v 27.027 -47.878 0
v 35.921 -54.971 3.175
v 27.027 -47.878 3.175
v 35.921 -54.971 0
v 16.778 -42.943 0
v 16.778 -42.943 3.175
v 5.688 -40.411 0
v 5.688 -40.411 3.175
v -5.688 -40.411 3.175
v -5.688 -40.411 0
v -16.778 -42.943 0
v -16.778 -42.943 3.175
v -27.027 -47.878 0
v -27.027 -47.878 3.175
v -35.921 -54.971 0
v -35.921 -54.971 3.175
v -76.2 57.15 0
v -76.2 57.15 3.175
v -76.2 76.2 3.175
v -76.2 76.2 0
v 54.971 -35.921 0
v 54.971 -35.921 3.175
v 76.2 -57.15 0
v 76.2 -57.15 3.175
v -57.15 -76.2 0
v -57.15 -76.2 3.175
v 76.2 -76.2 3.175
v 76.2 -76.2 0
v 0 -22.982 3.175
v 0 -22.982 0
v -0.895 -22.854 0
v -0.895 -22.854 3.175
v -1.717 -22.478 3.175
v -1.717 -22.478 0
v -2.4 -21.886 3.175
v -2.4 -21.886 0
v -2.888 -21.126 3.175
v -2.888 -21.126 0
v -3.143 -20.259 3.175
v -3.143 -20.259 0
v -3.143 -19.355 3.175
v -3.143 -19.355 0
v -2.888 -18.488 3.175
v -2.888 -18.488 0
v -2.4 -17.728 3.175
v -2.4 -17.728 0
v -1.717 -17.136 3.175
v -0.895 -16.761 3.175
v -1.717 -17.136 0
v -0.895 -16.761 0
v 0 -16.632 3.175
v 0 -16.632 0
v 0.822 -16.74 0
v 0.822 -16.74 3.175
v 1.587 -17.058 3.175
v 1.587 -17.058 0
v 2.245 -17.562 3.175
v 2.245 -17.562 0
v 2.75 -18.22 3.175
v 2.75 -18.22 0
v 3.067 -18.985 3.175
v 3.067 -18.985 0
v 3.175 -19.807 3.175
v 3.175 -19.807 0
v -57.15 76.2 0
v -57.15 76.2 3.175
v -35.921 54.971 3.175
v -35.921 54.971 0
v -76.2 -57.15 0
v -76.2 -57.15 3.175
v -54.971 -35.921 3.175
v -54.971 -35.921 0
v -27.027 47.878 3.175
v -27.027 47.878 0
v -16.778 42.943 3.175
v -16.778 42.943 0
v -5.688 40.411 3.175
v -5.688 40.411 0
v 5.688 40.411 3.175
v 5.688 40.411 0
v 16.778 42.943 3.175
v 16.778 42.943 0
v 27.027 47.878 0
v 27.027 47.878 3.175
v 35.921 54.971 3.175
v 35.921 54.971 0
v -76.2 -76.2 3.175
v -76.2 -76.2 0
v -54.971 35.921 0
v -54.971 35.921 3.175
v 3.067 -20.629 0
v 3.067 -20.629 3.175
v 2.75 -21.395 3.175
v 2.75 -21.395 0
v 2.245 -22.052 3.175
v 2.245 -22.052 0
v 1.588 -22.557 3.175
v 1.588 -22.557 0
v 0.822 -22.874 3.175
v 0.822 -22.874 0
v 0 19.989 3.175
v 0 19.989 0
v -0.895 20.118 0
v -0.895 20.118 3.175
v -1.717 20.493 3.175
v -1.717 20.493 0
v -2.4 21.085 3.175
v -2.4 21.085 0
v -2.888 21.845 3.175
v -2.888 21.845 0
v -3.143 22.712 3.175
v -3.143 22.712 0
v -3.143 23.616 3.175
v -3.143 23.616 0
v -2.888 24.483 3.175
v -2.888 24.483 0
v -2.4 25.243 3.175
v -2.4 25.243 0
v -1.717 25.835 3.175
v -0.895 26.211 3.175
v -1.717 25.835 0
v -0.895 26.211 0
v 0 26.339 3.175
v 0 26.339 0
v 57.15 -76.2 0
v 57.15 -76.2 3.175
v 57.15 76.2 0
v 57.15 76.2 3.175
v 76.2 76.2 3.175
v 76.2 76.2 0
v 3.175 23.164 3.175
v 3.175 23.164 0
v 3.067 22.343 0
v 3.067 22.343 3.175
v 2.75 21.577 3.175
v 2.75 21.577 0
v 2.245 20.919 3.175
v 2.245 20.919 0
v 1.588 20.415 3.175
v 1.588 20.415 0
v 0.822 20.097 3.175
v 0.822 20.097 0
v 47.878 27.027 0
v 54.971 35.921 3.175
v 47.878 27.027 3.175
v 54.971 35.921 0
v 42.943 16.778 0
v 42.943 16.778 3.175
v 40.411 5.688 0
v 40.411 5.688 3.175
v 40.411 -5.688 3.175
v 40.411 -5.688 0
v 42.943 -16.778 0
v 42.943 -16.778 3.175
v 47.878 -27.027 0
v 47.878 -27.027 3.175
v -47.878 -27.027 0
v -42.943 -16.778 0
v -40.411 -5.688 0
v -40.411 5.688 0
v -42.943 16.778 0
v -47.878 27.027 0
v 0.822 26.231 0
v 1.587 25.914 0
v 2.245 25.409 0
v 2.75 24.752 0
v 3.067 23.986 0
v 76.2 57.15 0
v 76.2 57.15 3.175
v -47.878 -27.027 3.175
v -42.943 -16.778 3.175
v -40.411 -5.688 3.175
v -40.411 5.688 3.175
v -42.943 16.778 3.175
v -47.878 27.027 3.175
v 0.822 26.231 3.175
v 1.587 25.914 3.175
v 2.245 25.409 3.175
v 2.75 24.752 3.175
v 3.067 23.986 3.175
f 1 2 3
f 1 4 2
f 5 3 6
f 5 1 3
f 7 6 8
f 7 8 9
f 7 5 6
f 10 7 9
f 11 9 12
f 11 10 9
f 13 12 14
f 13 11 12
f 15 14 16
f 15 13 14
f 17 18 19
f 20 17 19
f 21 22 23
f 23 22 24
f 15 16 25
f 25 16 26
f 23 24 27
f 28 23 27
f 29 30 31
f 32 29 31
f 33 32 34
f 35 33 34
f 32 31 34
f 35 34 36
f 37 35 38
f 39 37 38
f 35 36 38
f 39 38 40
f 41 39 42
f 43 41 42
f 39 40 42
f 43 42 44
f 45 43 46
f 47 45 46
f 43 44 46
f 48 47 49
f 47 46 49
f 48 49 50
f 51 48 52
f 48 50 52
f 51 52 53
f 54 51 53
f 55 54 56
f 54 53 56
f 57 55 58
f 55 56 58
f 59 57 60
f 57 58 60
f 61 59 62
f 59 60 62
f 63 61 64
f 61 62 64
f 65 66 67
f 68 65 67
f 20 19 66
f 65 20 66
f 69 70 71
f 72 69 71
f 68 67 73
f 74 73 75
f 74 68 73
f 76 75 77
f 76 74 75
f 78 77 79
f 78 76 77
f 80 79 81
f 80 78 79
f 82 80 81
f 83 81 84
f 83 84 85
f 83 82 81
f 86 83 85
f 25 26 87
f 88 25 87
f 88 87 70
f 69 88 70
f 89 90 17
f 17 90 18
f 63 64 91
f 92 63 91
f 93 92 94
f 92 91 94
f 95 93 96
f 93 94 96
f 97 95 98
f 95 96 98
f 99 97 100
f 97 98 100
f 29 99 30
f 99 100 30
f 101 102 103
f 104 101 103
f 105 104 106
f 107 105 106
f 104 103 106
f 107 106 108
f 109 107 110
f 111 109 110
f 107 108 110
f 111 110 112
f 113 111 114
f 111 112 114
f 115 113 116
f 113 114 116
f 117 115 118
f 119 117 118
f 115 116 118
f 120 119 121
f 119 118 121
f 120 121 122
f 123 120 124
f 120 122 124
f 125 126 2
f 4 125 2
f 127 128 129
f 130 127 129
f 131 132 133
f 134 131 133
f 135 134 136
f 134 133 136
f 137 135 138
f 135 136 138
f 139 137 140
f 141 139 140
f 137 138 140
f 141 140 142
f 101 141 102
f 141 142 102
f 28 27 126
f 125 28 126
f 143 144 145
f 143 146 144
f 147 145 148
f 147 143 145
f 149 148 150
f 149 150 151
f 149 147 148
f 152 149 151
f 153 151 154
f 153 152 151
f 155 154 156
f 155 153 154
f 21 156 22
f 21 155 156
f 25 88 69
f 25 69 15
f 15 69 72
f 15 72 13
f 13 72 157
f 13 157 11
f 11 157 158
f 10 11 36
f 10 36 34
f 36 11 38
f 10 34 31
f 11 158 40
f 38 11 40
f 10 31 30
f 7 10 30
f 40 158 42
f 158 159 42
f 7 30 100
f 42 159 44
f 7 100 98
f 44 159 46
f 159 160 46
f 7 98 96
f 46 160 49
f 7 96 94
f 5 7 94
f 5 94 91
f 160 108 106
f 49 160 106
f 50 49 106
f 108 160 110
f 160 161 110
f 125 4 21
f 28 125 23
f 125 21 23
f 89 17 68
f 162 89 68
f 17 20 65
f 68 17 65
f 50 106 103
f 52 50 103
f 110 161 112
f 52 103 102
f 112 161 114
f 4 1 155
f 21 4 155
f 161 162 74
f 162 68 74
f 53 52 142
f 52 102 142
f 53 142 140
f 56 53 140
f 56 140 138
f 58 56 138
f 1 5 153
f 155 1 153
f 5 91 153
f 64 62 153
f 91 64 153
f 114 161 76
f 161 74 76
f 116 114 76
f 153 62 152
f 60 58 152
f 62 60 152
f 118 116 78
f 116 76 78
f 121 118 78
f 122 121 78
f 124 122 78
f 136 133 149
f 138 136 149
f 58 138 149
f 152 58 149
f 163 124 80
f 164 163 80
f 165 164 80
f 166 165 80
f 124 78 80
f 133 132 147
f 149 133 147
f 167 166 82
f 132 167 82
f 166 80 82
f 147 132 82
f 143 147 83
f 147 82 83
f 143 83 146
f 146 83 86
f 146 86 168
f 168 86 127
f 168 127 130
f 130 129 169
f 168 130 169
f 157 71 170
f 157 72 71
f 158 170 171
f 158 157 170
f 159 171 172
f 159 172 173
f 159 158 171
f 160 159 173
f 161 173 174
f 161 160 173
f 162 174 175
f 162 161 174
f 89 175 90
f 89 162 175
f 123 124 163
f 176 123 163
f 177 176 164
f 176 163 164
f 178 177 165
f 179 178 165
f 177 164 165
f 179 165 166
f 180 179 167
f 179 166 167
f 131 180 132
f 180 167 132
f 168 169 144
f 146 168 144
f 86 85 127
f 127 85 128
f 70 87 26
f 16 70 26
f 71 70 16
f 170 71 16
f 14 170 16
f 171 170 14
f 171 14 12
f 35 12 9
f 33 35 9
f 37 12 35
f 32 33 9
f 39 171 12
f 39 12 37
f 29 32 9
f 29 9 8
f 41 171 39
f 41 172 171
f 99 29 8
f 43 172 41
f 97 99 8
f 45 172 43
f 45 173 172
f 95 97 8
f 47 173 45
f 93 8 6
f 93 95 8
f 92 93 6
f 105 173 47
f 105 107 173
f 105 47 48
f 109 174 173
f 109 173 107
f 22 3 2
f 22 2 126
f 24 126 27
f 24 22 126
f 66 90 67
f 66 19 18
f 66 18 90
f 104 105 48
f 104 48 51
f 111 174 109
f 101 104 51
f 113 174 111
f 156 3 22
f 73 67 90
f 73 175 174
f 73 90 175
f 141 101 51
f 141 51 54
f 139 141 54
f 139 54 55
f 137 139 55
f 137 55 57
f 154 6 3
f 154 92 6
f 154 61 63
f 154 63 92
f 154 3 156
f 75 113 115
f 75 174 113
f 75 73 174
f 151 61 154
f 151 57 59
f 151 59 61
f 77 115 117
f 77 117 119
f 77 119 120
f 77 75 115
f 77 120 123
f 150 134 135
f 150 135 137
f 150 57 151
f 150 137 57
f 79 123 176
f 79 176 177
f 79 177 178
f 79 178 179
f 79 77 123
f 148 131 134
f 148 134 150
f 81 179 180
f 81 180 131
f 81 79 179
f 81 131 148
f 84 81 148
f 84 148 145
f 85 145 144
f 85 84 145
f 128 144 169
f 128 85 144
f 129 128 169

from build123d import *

# Parameters (mm, degrees)
F0_W     = 508
F0_H     = 508
F1_DEPTH = 3.175
F3_DEPTH = 3.176
F4_R     = 50.8
F6_DEPTH = 3.176
F7_R     = 1.5875
F8_DEPTH = 3.176


with BuildPart() as f1:
    # F0 (on Top) → F1 (new body)
    with BuildSketch(Plane.XY):
        Rectangle(F0_W, F0_H)
    extrude(amount=F1_DEPTH)

    # F2 (on face) → F3 (cut, through all)
    with BuildSketch(Plane.XY.offset(3.175)):
        Polygon((-19.05, 0), (-254, 234.95), (-254, -234.95), align=None)
        Polygon((-234.95, 254), (0, 19.05), (234.95, 254), align=None)
        Polygon((254, -234.95), (254, 234.95), (19.05, 0), align=None)
        Polygon((-234.95, -254), (234.95, -254), (0, -19.05), align=None)
    extrude(amount=-F3_DEPTH, mode=Mode.SUBTRACT)

    # F4
    f4_edges = [f1.edges().sort_by_distance(p)[0] for p in [
        (-19.05, 0, 1.5875),
        (0, -19.05, 1.5875),
        (19.05, 0, 1.5875),
        (0, 19.05, 1.5875),
    ]]
    fillet(f4_edges, radius=F4_R)

    # F5 (on face) → F6 (cut, through all)
    with BuildSketch(Plane(origin=(0, 0, 0), x_dir=(1, 0, 0), z_dir=(0, 0, -1))):
        with BuildLine():
            ThreePointArc((-235.2896751078, -247.0952381308), (-235.8602181666, -247.0987727715), (-236.3926626451, -247.3037965579))
            Line((-236.3926626451, -247.3037965579), (-235.5652720105, -248.6586327059))
            Line((-235.5652720105, -248.6586327059), (-235.2896751078, -247.0952381308))
        make_face()
        with BuildLine():
            Line((-235.5652720105, -248.6586327059), (-236.3926626451, -247.3037965579))
            ThreePointArc((-236.3926626451, -247.3037965579), (-236.8182319942, -247.6838262999), (-237.0819548651, -248.189773059))
            Line((-237.0819548651, -248.189773059), (-235.5652720105, -248.6586327059))
        make_face()
        with BuildLine():
            ThreePointArc((-233.9777720105, -248.6586327059), (-234.3491991646, -247.6381803143), (-235.2896751078, -247.0952381308))
            Line((-235.2896751078, -247.0952381308), (-235.5652720105, -248.6586327059))
            Line((-235.5652720105, -248.6586327059), (-237.0819548651, -248.189773059))
            ThreePointArc((-237.0819548651, -248.189773059), (-235.8023608316, -250.2283285811), (-233.9777720105, -248.6586327059))
        make_face()
        with BuildLine():
            Line((-247.6987348476, -244.9077555312), (-247.423137945, -243.3443609562))
            ThreePointArc((-247.423137945, -243.3443609562), (-249.0535709955, -245.7351461659), (-246.182051993, -245.376615178))
            Line((-246.182051993, -245.376615178), (-247.6987348476, -244.9077555312))
        make_face()
        with BuildLine():
            ThreePointArc((-244.6665689917, -233.7554350788), (-244.2409996426, -233.3754053369), (-243.9772767717, -232.8694585778))
            Line((-243.9772767717, -232.8694585778), (-245.4939596263, -232.4005989309))
            Line((-245.4939596263, -232.4005989309), (-244.6665689917, -233.7554350788))
        make_face()
        with BuildLine():
            ThreePointArc((-245.769556529, -233.963993506), (-245.1990134701, -233.9604588653), (-244.6665689917, -233.7554350788))
            Line((-244.6665689917, -233.7554350788), (-245.4939596263, -232.4005989309))
            Line((-245.4939596263, -232.4005989309), (-245.769556529, -233.963993506))
        make_face()
        with BuildLine():
            Line((-245.4939596263, -232.4005989309), (-243.9772767717, -232.8694585778))
            ThreePointArc((-243.9772767717, -232.8694585778), (-243.9242637511, -232.6376877521), (-243.9064596263, -232.4005989309))
            ThreePointArc((-243.9064596263, -232.4005989309), (-246.5144120179, -231.1845260851), (-245.769556529, -233.963993506))
            Line((-245.769556529, -233.963993506), (-245.4939596263, -232.4005989309))
        make_face()
        with BuildLine():
            ThreePointArc((-231.7729967892, -236.1514761056), (-233.123407968, -234.5817802303), (-234.8771796438, -235.6826164588))
            Line((-234.8771796438, -235.6826164588), (-233.3604967892, -236.1514761056))
            Line((-233.3604967892, -236.1514761056), (-233.6360936918, -237.7148706806))
            ThreePointArc((-233.6360936918, -237.7148706806), (-232.3400443976, -237.3675489515), (-231.7729967892, -236.1514761056))
        make_face()
        with BuildLine():
            Line((-233.3604967892, -236.1514761056), (-234.8771796438, -235.6826164588))
            ThreePointArc((-234.8771796438, -235.6826164588), (-234.7153329371, -236.9788667402), (-233.6360936918, -237.7148706806))
            Line((-233.6360936918, -237.7148706806), (-233.3604967892, -236.1514761056))
        make_face()
        with BuildLine():
            ThreePointArc((-246.1112348476, -244.9077555312), (-246.4826620017, -243.8873031396), (-247.423137945, -243.3443609562))
            Line((-247.423137945, -243.3443609562), (-247.6987348476, -244.9077555312))
            Line((-247.6987348476, -244.9077555312), (-246.182051993, -245.376615178))
            ThreePointArc((-246.182051993, -245.376615178), (-246.1290389723, -245.1448443524), (-246.1112348476, -244.9077555312))
        make_face()
        with BuildLine():
            Line((-233.3604967892, 244.9077555312), (-233.6360936918, 243.3443609562))
            ThreePointArc((-233.6360936918, 243.3443609562), (-232.3400443976, 243.6916826853), (-231.7729967892, 244.9077555312))
            ThreePointArc((-231.7729967892, 244.9077555312), (-233.123407968, 246.4774514065), (-234.8771796438, 245.376615178))
            Line((-234.8771796438, 245.376615178), (-233.3604967892, 244.9077555312))
        make_face()
        with BuildLine():
            ThreePointArc((-234.8771796438, 245.376615178), (-234.7153329371, 244.0803648965), (-233.6360936918, 243.3443609562))
            Line((-233.6360936918, 243.3443609562), (-233.3604967892, 244.9077555312))
            Line((-233.3604967892, 244.9077555312), (-234.8771796438, 245.376615178))
        make_face()
        with BuildLine():
            Line((-245.4939596263, 248.6586327059), (-244.6665689917, 247.3037965579))
            ThreePointArc((-244.6665689917, 247.3037965579), (-244.2409996426, 247.6838262999), (-243.9772767717, 248.189773059))
            Line((-243.9772767717, 248.189773059), (-245.4939596263, 248.6586327059))
        make_face()
        with BuildLine():
            ThreePointArc((-245.769556529, 247.0952381308), (-245.1990134701, 247.0987727715), (-244.6665689917, 247.3037965579))
            Line((-244.6665689917, 247.3037965579), (-245.4939596263, 248.6586327059))
            Line((-245.4939596263, 248.6586327059), (-245.769556529, 247.0952381308))
        make_face()
        with BuildLine():
            ThreePointArc((-243.9064596263, 248.6586327059), (-246.5144120179, 249.8747055517), (-245.769556529, 247.0952381308))
            Line((-245.769556529, 247.0952381308), (-245.4939596263, 248.6586327059))
            Line((-245.4939596263, 248.6586327059), (-243.9772767717, 248.189773059))
            ThreePointArc((-243.9772767717, 248.189773059), (-243.9242637511, 248.4215438847), (-243.9064596263, 248.6586327059))
        make_face()
        with BuildLine():
            ThreePointArc((-246.1112348476, 236.1514761056), (-246.4826620017, 237.1719284972), (-247.423137945, 237.7148706806))
            Line((-247.423137945, 237.7148706806), (-247.6987348476, 236.1514761056))
            Line((-247.6987348476, 236.1514761056), (-246.182051993, 235.6826164588))
            ThreePointArc((-246.182051993, 235.6826164588), (-246.1290389723, 235.9143872844), (-246.1112348476, 236.1514761056))
        make_face()
        with BuildLine():
            Line((-247.6987348476, 236.1514761056), (-247.423137945, 237.7148706806))
            ThreePointArc((-247.423137945, 237.7148706806), (-249.0535709955, 235.3240854709), (-246.182051993, 235.6826164588))
            Line((-246.182051993, 235.6826164588), (-247.6987348476, 236.1514761056))
        make_face()
        with BuildLine():
            ThreePointArc((-233.9777720105, 232.4005989309), (-234.3491991646, 233.4210513225), (-235.2896751078, 233.963993506))
            Line((-235.2896751078, 233.963993506), (-235.5652720105, 232.4005989309))
            Line((-235.5652720105, 232.4005989309), (-237.0819548651, 232.8694585778))
            ThreePointArc((-237.0819548651, 232.8694585778), (-235.8023608316, 230.8309030557), (-233.9777720105, 232.4005989309))
        make_face()
        with BuildLine():
            Line((-235.5652720105, 232.4005989309), (-235.2896751078, 233.963993506))
            ThreePointArc((-235.2896751078, 233.963993506), (-235.8602181666, 233.9604588653), (-236.3926626451, 233.7554350788))
            Line((-236.3926626451, 233.7554350788), (-235.5652720105, 232.4005989309))
        make_face()
        with BuildLine():
            Line((-235.5652720105, 232.4005989309), (-236.3926626451, 233.7554350788))
            ThreePointArc((-236.3926626451, 233.7554350788), (-236.8182319942, 233.3754053369), (-237.0819548651, 232.8694585778))
            Line((-237.0819548651, 232.8694585778), (-235.5652720105, 232.4005989309))
        make_face()
        with BuildLine():
            Line((247.6987348476, 244.9077555312), (247.423137945, 243.3443609562))
            ThreePointArc((247.423137945, 243.3443609562), (248.7191872392, 243.6916826853), (249.2862348476, 244.9077555312))
            ThreePointArc((249.2862348476, 244.9077555312), (247.9358236688, 246.4774514065), (246.182051993, 245.376615178))
            Line((246.182051993, 245.376615178), (247.6987348476, 244.9077555312))
        make_face()
        with BuildLine():
            ThreePointArc((246.182051993, 245.376615178), (246.3438986997, 244.0803648965), (247.423137945, 243.3443609562))
            Line((247.423137945, 243.3443609562), (247.6987348476, 244.9077555312))
            Line((247.6987348476, 244.9077555312), (246.182051993, 245.376615178))
        make_face()
        with BuildLine():
            ThreePointArc((245.769556529, 233.963993506), (245.1990134701, 233.9604588653), (244.6665689917, 233.7554350788))
            Line((244.6665689917, 233.7554350788), (245.4939596263, 232.4005989309))
            Line((245.4939596263, 232.4005989309), (245.769556529, 233.963993506))
        make_face()
        with BuildLine():
            Line((245.4939596263, 232.4005989309), (243.9772767717, 232.8694585778))
            ThreePointArc((243.9772767717, 232.8694585778), (245.2568708052, 230.8309030557), (247.0814596263, 232.4005989309))
            ThreePointArc((247.0814596263, 232.4005989309), (246.7100324722, 233.4210513225), (245.769556529, 233.963993506))
            Line((245.769556529, 233.963993506), (245.4939596263, 232.4005989309))
        make_face()
        with BuildLine():
            ThreePointArc((244.6665689917, 233.7554350788), (244.2409996426, 233.3754053369), (243.9772767717, 232.8694585778))
            Line((243.9772767717, 232.8694585778), (245.4939596263, 232.4005989309))
            Line((245.4939596263, 232.4005989309), (244.6665689917, 233.7554350788))
        make_face()
        with BuildLine():
            ThreePointArc((233.6360936918, 237.7148706806), (232.0056606413, 235.3240854709), (234.8771796438, 235.6826164588))
            Line((234.8771796438, 235.6826164588), (233.3604967892, 236.1514761056))
            Line((233.3604967892, 236.1514761056), (233.6360936918, 237.7148706806))
        make_face()
        with BuildLine():
            Line((233.3604967892, 236.1514761056), (234.8771796438, 235.6826164588))
            ThreePointArc((234.8771796438, 235.6826164588), (234.9301926645, 235.9143872844), (234.9479967892, 236.1514761056))
            ThreePointArc((234.9479967892, 236.1514761056), (234.5765696351, 237.1719284972), (233.6360936918, 237.7148706806))
            Line((233.6360936918, 237.7148706806), (233.3604967892, 236.1514761056))
        make_face()
        with BuildLine():
            ThreePointArc((235.2896751078, 247.0952381308), (235.8602181666, 247.0987727715), (236.3926626451, 247.3037965579))
            Line((236.3926626451, 247.3037965579), (235.5652720105, 248.6586327059))
            Line((235.5652720105, 248.6586327059), (235.2896751078, 247.0952381308))
        make_face()
        with BuildLine():
            Line((235.5652720105, 248.6586327059), (236.3926626451, 247.3037965579))
            ThreePointArc((236.3926626451, 247.3037965579), (236.8182319942, 247.6838262999), (237.0819548651, 248.189773059))
            Line((237.0819548651, 248.189773059), (235.5652720105, 248.6586327059))
        make_face()
        with BuildLine():
            ThreePointArc((237.1527720105, 248.6586327059), (234.5448196189, 249.8747055517), (235.2896751078, 247.0952381308))
            Line((235.2896751078, 247.0952381308), (235.5652720105, 248.6586327059))
            Line((235.5652720105, 248.6586327059), (237.0819548651, 248.189773059))
            ThreePointArc((237.0819548651, 248.189773059), (237.1349678857, 248.4215438847), (237.1527720105, 248.6586327059))
        make_face()
        with BuildLine():
            ThreePointArc((247.0814596263, -248.6586327059), (246.7100324722, -247.6381803143), (245.769556529, -247.0952381308))
            Line((245.769556529, -247.0952381308), (245.4939596263, -248.6586327059))
            Line((245.4939596263, -248.6586327059), (243.9772767717, -248.189773059))
            ThreePointArc((243.9772767717, -248.189773059), (245.2568708052, -250.2283285811), (247.0814596263, -248.6586327059))
        make_face()
        with BuildLine():
            Line((245.4939596263, -248.6586327059), (244.6665689917, -247.3037965579))
            ThreePointArc((244.6665689917, -247.3037965579), (244.2409996426, -247.6838262999), (243.9772767717, -248.189773059))
            Line((243.9772767717, -248.189773059), (245.4939596263, -248.6586327059))
        make_face()
        with BuildLine():
            ThreePointArc((245.769556529, -247.0952381308), (245.1990134701, -247.0987727715), (244.6665689917, -247.3037965579))
            Line((244.6665689917, -247.3037965579), (245.4939596263, -248.6586327059))
            Line((245.4939596263, -248.6586327059), (245.769556529, -247.0952381308))
        make_face()
        with BuildLine():
            ThreePointArc((234.9479967892, -244.9077555312), (234.5765696351, -243.8873031396), (233.6360936918, -243.3443609562))
            Line((233.6360936918, -243.3443609562), (233.3604967892, -244.9077555312))
            Line((233.3604967892, -244.9077555312), (234.8771796438, -245.376615178))
            ThreePointArc((234.8771796438, -245.376615178), (234.9301926645, -245.1448443524), (234.9479967892, -244.9077555312))
        make_face()
        with BuildLine():
            Line((233.3604967892, -244.9077555312), (233.6360936918, -243.3443609562))
            ThreePointArc((233.6360936918, -243.3443609562), (232.0056606413, -245.7351461659), (234.8771796438, -245.376615178))
            Line((234.8771796438, -245.376615178), (233.3604967892, -244.9077555312))
        make_face()
        with BuildLine():
            Line((235.5652720105, -232.4005989309), (235.2896751078, -233.963993506))
            ThreePointArc((235.2896751078, -233.963993506), (235.8602181666, -233.9604588653), (236.3926626451, -233.7554350788))
            Line((236.3926626451, -233.7554350788), (235.5652720105, -232.4005989309))
        make_face()
        with BuildLine():
            Line((235.5652720105, -232.4005989309), (236.3926626451, -233.7554350788))
            ThreePointArc((236.3926626451, -233.7554350788), (236.8182319942, -233.3754053369), (237.0819548651, -232.8694585778))
            Line((237.0819548651, -232.8694585778), (235.5652720105, -232.4005989309))
        make_face()
        with BuildLine():
            ThreePointArc((237.1527720105, -232.4005989309), (234.5448196189, -231.1845260851), (235.2896751078, -233.963993506))
            Line((235.2896751078, -233.963993506), (235.5652720105, -232.4005989309))
            Line((235.5652720105, -232.4005989309), (237.0819548651, -232.8694585778))
            ThreePointArc((237.0819548651, -232.8694585778), (237.1349678857, -232.6376877521), (237.1527720105, -232.4005989309))
        make_face()
        with BuildLine():
            ThreePointArc((246.182051993, -235.6826164588), (246.3438986997, -236.9788667402), (247.423137945, -237.7148706806))
            Line((247.423137945, -237.7148706806), (247.6987348476, -236.1514761056))
            Line((247.6987348476, -236.1514761056), (246.182051993, -235.6826164588))
        make_face()
        with BuildLine():
            Line((247.6987348476, -236.1514761056), (247.423137945, -237.7148706806))
            ThreePointArc((247.423137945, -237.7148706806), (248.7191872392, -237.3675489515), (249.2862348476, -236.1514761056))
            ThreePointArc((249.2862348476, -236.1514761056), (247.9358236688, -234.5817802303), (246.182051993, -235.6826164588))
            Line((246.182051993, -235.6826164588), (247.6987348476, -236.1514761056))
        make_face()
        with BuildLine():
            Line((0, 22.9821543127), (0, 16.6321543127))
            ThreePointArc((0, 16.6321543127), (2.2450640303, 17.5620902825), (3.175, 19.8071543127))
            ThreePointArc((3.175, 19.8071543127), (2.2450640303, 22.052218343), (0, 22.9821543127))
        make_face()
        with BuildLine():
            Line((0, -26.339305836), (0, -19.989305836))
            ThreePointArc((0, -19.989305836), (-3.175, -23.164305836), (0, -26.339305836))
        make_face()
        with BuildLine():
            ThreePointArc((3.175, -23.164305836), (2.2450640303, -20.9192418057), (0, -19.989305836))
            Line((0, -19.989305836), (0, -26.339305836))
            ThreePointArc((0, -26.339305836), (2.2450640303, -25.4093698662), (3.175, -23.164305836))
        make_face()
        with BuildLine():
            ThreePointArc((0, 22.9821543127), (-3.175, 19.8071543127), (0, 16.6321543127))
            Line((0, 16.6321543127), (0, 22.9821543127))
        make_face()
    extrude(amount=-F6_DEPTH, mode=Mode.SUBTRACT)

    # F7 (on face) → F8 (cut, through all)
    with BuildSketch(Plane.XY.offset(3.175)):
        Polygon((-76.2, 76.2), (-57.15, 76.2), (-234.95, 254), (-254, 254), (-254, 234.95), (-76.2, 57.15), align=None)
        with Locations((-245.4939596263, 232.4005989309)):
            Circle(F7_R, mode=Mode.SUBTRACT)
        with Locations((-233.3604967892, 236.1514761056)):
            Circle(F7_R, mode=Mode.SUBTRACT)
        with Locations((-247.6987348476, 244.9077555312)):
            Circle(F7_R, mode=Mode.SUBTRACT)
        with Locations((-235.5652720105, 248.6586327059)):
            Circle(F7_R, mode=Mode.SUBTRACT)
        Polygon((57.15, 76.2), (76.2, 76.2), (76.2, 57.15), (254, 234.95), (254, 254), (234.95, 254), align=None)
        with Locations((235.5652720105, 232.4005989309)):
            Circle(F7_R, mode=Mode.SUBTRACT)
        with Locations((247.6987348476, 236.1514761056)):
            Circle(F7_R, mode=Mode.SUBTRACT)
        with Locations((233.3604967892, 244.9077555312)):
            Circle(F7_R, mode=Mode.SUBTRACT)
        with Locations((245.4939596263, 248.6586327059)):
            Circle(F7_R, mode=Mode.SUBTRACT)
        Polygon((254, -234.95), (76.2, -57.15), (76.2, -76.2), (57.15, -76.2), (234.95, -254), (254, -254), align=None)
        with Locations((235.5652720105, -248.6586327059)):
            Circle(F7_R, mode=Mode.SUBTRACT)
        with Locations((247.6987348476, -244.9077555312)):
            Circle(F7_R, mode=Mode.SUBTRACT)
        with Locations((233.3604967892, -236.1514761056)):
            Circle(F7_R, mode=Mode.SUBTRACT)
        with Locations((245.4939596263, -232.4005989309)):
            Circle(F7_R, mode=Mode.SUBTRACT)
        Polygon((-76.2, -76.2), (-76.2, -57.15), (-254, -234.95), (-254, -254), (-234.95, -254), (-57.15, -76.2), align=None)
        with Locations((-245.4939596263, -248.6586327059)):
            Circle(F7_R, mode=Mode.SUBTRACT)
        with Locations((-233.3604967892, -244.9077555312)):
            Circle(F7_R, mode=Mode.SUBTRACT)
        with Locations((-247.6987348476, -236.1514761056)):
            Circle(F7_R, mode=Mode.SUBTRACT)
        with Locations((-235.5652720105, -232.4005989309)):
            Circle(F7_R, mode=Mode.SUBTRACT)
    extrude(amount=-F8_DEPTH, mode=Mode.SUBTRACT)


solid = f1.part
